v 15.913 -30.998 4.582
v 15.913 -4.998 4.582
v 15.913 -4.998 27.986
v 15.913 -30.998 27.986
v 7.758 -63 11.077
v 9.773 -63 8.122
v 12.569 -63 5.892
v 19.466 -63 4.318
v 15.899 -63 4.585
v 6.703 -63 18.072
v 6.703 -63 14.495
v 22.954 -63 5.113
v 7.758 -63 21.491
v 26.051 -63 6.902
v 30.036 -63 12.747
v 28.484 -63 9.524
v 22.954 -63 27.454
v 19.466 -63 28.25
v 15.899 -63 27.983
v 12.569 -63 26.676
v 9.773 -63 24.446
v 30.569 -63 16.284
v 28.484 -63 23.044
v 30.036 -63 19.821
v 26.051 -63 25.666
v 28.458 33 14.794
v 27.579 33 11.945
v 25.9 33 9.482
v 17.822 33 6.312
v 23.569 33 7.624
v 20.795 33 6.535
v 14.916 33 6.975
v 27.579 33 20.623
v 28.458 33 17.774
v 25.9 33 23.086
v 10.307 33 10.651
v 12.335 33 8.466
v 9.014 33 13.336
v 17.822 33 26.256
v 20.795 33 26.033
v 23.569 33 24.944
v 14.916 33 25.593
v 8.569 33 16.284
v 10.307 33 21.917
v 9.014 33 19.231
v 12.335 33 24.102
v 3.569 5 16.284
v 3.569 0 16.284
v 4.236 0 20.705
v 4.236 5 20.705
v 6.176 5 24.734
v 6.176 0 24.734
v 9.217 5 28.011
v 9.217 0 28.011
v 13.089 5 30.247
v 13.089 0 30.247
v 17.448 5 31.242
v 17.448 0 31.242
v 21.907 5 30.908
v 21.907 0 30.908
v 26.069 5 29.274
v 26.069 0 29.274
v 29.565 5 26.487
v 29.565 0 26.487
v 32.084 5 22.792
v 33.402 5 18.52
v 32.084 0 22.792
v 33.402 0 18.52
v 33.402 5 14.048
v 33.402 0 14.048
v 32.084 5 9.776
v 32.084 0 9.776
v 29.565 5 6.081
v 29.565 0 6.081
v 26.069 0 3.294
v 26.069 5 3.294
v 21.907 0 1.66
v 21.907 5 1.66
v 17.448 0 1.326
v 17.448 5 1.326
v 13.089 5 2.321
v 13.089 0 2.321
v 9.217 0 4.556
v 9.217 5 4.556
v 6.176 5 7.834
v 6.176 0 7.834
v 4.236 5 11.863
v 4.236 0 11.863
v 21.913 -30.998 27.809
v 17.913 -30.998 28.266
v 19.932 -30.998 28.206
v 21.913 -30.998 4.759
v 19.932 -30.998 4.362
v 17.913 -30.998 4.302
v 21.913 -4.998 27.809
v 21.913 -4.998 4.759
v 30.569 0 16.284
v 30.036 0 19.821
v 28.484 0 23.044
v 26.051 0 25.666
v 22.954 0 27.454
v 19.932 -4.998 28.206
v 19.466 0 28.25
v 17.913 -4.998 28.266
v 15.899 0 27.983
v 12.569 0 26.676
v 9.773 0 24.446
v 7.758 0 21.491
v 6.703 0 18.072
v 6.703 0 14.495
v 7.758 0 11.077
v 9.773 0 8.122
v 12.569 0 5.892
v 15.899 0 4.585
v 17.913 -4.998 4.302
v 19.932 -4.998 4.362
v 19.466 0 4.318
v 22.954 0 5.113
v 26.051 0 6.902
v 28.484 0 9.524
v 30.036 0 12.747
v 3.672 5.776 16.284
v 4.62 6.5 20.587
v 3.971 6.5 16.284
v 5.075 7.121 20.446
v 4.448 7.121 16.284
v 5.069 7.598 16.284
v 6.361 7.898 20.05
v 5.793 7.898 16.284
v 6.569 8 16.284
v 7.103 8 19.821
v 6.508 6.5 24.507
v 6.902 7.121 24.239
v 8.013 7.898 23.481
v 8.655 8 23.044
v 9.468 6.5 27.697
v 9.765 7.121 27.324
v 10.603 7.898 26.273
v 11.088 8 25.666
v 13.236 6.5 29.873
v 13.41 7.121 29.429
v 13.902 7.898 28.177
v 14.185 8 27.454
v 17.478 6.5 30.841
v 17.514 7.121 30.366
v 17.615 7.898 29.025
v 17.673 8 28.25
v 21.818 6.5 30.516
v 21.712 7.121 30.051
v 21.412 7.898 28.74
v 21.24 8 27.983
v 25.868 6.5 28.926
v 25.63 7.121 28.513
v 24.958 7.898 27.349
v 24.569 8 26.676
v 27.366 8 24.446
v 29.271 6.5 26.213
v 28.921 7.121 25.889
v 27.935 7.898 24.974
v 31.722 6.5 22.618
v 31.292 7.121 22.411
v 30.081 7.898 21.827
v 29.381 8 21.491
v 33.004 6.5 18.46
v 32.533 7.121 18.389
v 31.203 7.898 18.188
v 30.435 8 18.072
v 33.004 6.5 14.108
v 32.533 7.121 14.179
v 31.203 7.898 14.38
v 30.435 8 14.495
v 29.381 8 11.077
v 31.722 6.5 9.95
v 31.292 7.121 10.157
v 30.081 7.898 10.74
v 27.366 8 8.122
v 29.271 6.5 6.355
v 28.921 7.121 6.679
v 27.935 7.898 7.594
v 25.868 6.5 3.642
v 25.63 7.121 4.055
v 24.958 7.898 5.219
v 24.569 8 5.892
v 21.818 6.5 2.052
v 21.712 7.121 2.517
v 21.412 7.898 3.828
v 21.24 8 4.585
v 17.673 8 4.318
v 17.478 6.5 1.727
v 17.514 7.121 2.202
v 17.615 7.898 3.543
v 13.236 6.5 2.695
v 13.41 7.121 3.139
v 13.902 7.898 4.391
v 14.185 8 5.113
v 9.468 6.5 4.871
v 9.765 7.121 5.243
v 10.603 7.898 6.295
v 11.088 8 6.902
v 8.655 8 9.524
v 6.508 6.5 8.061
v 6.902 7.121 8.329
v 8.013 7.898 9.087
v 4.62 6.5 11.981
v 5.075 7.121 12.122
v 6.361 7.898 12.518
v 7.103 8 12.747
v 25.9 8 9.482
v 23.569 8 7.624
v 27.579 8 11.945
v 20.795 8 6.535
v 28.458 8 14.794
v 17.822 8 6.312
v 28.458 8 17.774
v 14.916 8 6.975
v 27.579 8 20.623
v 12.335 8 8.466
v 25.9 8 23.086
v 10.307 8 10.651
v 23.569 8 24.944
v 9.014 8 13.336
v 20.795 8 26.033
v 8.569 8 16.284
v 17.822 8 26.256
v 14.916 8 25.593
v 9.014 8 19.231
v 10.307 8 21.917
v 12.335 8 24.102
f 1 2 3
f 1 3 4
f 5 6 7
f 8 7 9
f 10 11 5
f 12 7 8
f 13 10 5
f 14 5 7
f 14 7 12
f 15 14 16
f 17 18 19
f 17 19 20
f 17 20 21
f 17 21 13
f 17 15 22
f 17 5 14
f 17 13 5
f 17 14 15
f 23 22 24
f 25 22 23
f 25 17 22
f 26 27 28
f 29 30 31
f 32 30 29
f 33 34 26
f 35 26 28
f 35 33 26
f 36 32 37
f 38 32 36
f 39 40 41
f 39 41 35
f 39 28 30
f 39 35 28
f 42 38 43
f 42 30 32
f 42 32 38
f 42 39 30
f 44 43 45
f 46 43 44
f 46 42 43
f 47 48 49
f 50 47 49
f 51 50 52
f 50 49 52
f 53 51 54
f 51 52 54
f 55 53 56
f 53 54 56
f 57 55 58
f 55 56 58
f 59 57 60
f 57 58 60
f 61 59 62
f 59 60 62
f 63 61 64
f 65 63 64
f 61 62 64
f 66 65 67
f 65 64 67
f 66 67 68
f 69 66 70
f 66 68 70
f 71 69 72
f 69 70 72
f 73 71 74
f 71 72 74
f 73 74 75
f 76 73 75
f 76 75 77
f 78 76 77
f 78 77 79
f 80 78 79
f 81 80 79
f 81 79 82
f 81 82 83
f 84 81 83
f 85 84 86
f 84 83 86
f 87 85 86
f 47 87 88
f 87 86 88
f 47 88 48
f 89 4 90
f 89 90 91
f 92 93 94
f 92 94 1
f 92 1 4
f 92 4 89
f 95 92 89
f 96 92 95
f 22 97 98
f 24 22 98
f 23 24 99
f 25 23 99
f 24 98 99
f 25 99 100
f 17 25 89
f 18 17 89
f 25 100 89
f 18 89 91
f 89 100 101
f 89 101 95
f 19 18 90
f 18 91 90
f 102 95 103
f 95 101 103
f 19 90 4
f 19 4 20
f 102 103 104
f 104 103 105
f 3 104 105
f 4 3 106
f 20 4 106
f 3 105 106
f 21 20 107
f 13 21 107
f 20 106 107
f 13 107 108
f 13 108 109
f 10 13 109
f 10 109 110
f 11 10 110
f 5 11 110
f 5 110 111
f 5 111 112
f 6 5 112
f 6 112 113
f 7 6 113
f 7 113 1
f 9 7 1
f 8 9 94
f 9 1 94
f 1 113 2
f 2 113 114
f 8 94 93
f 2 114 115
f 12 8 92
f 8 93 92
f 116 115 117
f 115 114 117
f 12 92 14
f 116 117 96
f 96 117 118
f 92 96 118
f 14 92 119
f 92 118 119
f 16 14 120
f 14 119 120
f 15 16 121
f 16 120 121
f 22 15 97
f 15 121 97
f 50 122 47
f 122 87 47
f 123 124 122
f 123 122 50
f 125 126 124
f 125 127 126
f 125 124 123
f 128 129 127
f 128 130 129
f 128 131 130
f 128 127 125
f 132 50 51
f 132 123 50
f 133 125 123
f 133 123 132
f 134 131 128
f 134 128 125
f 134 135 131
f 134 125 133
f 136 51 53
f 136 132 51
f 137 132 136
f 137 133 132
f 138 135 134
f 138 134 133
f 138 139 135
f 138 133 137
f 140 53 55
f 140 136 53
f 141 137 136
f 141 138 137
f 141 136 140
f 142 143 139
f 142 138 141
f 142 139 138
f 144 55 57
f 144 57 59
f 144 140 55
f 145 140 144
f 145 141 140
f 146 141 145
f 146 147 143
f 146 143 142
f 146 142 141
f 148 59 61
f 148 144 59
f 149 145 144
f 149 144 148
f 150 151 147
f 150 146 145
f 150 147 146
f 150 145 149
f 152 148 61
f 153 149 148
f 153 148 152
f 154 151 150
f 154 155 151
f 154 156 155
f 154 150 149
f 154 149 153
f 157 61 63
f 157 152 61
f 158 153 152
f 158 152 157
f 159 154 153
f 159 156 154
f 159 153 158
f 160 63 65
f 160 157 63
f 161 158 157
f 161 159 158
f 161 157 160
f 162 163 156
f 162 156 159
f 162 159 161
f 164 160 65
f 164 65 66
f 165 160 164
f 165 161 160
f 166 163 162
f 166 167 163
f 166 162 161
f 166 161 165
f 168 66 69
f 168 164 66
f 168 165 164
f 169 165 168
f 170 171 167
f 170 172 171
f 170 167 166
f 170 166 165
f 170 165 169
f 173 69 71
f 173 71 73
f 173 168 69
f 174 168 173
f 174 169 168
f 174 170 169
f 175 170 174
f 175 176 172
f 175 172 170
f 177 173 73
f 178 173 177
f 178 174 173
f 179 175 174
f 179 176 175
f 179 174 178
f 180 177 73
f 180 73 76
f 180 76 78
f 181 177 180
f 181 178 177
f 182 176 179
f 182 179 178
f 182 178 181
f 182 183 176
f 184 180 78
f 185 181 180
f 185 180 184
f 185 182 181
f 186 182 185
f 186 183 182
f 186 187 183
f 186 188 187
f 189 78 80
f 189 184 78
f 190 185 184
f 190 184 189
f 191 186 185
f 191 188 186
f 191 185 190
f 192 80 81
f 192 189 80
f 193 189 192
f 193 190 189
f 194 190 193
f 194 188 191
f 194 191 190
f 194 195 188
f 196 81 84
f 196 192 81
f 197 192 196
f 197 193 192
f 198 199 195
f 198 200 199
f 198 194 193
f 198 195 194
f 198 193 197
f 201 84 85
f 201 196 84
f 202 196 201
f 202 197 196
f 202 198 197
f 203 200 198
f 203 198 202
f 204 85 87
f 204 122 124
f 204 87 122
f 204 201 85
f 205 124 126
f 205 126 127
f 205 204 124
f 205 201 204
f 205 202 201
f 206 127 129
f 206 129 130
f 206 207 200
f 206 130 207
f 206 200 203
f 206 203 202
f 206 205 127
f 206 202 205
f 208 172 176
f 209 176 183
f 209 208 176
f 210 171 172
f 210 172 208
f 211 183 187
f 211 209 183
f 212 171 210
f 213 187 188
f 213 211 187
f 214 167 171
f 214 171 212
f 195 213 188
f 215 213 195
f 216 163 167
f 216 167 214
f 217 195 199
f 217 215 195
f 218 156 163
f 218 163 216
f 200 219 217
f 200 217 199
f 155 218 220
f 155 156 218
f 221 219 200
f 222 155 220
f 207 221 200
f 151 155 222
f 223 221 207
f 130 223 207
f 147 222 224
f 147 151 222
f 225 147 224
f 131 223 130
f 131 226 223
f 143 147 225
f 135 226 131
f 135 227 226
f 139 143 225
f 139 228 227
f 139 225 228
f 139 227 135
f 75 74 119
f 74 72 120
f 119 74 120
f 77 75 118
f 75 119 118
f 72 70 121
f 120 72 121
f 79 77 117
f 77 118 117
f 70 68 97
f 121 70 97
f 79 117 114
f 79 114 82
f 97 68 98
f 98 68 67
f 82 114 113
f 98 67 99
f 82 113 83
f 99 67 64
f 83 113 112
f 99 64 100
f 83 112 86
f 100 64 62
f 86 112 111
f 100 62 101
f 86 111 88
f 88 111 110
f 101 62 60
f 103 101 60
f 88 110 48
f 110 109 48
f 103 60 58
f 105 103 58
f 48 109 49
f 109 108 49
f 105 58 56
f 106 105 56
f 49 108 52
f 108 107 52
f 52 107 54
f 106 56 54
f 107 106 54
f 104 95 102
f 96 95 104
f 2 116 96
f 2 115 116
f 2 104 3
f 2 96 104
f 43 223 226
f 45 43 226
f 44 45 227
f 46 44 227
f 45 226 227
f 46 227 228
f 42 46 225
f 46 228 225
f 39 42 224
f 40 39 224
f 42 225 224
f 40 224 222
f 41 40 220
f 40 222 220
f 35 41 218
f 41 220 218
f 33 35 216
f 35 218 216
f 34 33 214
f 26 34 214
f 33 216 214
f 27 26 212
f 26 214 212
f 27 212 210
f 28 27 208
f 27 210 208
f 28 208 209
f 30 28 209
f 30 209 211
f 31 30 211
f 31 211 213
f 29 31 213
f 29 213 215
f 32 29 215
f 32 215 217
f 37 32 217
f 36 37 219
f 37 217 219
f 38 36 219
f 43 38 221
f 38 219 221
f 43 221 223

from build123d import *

# Parameters (mm, degrees)
F0_R     = 12
F1_DEPTH = 63
F2_R     = 15
F2_R_2   = 12
F3_DEPTH = 8
F4_R     = 10
F5_DEPTH = 25
F6_R     = 3
F8_DEPTH = 31.2849479744


with BuildPart() as f1:
    # F0 (on Front) → F1 (new body)
    with BuildSketch(Plane.XZ):
        with Locations((18.5694117099, 16.2839479744)):
            Circle(F0_R)
    extrude(amount=F1_DEPTH)

    # F2 (on face) → F3 (join)
    with BuildSketch(Plane(origin=(0, 0, 0), x_dir=(-1, 0, 0), z_dir=(0, 1, 0))):
        with Locations((-18.5694117099, 16.2839479744)):
            Circle(F2_R)
        with Locations((-18.5694117099, 16.2839479744)):
            Circle(F2_R_2, mode=Mode.SUBTRACT)
        with Locations((-18.5694117099, 16.2839479744)):
            Circle(F2_R_2)
    extrude(amount=F3_DEPTH)

    # F4 (on face) → F5 (join)
    with BuildSketch(Plane(origin=(0, 8, 0), x_dir=(-1, 0, 0), z_dir=(0, 1, 0))):
        with Locations((-18.5694117099, 16.2839479744)):
            Circle(F4_R)
    extrude(amount=F5_DEPTH)

    # F6
    f6_edges = [f1.edges().sort_by_distance(p)[0] for p in [
        (33.569412, 8, 16.283948),
    ]]
    fillet(f6_edges, radius=F6_R)

    # F7 (on Top) → F8 (cut, through all)
    with BuildSketch(Plane.XY):
        Polygon((21.912544474, -4.9977113605), (18.912544474, -4.9977113605), (15.912544474, -4.9977113605), (15.912544474, -30.9977113605), (18.912544474, -30.9977113605), (21.912544474, -30.9977113605), align=None)
    extrude(amount=F8_DEPTH, mode=Mode.SUBTRACT)


solid = f1.part
